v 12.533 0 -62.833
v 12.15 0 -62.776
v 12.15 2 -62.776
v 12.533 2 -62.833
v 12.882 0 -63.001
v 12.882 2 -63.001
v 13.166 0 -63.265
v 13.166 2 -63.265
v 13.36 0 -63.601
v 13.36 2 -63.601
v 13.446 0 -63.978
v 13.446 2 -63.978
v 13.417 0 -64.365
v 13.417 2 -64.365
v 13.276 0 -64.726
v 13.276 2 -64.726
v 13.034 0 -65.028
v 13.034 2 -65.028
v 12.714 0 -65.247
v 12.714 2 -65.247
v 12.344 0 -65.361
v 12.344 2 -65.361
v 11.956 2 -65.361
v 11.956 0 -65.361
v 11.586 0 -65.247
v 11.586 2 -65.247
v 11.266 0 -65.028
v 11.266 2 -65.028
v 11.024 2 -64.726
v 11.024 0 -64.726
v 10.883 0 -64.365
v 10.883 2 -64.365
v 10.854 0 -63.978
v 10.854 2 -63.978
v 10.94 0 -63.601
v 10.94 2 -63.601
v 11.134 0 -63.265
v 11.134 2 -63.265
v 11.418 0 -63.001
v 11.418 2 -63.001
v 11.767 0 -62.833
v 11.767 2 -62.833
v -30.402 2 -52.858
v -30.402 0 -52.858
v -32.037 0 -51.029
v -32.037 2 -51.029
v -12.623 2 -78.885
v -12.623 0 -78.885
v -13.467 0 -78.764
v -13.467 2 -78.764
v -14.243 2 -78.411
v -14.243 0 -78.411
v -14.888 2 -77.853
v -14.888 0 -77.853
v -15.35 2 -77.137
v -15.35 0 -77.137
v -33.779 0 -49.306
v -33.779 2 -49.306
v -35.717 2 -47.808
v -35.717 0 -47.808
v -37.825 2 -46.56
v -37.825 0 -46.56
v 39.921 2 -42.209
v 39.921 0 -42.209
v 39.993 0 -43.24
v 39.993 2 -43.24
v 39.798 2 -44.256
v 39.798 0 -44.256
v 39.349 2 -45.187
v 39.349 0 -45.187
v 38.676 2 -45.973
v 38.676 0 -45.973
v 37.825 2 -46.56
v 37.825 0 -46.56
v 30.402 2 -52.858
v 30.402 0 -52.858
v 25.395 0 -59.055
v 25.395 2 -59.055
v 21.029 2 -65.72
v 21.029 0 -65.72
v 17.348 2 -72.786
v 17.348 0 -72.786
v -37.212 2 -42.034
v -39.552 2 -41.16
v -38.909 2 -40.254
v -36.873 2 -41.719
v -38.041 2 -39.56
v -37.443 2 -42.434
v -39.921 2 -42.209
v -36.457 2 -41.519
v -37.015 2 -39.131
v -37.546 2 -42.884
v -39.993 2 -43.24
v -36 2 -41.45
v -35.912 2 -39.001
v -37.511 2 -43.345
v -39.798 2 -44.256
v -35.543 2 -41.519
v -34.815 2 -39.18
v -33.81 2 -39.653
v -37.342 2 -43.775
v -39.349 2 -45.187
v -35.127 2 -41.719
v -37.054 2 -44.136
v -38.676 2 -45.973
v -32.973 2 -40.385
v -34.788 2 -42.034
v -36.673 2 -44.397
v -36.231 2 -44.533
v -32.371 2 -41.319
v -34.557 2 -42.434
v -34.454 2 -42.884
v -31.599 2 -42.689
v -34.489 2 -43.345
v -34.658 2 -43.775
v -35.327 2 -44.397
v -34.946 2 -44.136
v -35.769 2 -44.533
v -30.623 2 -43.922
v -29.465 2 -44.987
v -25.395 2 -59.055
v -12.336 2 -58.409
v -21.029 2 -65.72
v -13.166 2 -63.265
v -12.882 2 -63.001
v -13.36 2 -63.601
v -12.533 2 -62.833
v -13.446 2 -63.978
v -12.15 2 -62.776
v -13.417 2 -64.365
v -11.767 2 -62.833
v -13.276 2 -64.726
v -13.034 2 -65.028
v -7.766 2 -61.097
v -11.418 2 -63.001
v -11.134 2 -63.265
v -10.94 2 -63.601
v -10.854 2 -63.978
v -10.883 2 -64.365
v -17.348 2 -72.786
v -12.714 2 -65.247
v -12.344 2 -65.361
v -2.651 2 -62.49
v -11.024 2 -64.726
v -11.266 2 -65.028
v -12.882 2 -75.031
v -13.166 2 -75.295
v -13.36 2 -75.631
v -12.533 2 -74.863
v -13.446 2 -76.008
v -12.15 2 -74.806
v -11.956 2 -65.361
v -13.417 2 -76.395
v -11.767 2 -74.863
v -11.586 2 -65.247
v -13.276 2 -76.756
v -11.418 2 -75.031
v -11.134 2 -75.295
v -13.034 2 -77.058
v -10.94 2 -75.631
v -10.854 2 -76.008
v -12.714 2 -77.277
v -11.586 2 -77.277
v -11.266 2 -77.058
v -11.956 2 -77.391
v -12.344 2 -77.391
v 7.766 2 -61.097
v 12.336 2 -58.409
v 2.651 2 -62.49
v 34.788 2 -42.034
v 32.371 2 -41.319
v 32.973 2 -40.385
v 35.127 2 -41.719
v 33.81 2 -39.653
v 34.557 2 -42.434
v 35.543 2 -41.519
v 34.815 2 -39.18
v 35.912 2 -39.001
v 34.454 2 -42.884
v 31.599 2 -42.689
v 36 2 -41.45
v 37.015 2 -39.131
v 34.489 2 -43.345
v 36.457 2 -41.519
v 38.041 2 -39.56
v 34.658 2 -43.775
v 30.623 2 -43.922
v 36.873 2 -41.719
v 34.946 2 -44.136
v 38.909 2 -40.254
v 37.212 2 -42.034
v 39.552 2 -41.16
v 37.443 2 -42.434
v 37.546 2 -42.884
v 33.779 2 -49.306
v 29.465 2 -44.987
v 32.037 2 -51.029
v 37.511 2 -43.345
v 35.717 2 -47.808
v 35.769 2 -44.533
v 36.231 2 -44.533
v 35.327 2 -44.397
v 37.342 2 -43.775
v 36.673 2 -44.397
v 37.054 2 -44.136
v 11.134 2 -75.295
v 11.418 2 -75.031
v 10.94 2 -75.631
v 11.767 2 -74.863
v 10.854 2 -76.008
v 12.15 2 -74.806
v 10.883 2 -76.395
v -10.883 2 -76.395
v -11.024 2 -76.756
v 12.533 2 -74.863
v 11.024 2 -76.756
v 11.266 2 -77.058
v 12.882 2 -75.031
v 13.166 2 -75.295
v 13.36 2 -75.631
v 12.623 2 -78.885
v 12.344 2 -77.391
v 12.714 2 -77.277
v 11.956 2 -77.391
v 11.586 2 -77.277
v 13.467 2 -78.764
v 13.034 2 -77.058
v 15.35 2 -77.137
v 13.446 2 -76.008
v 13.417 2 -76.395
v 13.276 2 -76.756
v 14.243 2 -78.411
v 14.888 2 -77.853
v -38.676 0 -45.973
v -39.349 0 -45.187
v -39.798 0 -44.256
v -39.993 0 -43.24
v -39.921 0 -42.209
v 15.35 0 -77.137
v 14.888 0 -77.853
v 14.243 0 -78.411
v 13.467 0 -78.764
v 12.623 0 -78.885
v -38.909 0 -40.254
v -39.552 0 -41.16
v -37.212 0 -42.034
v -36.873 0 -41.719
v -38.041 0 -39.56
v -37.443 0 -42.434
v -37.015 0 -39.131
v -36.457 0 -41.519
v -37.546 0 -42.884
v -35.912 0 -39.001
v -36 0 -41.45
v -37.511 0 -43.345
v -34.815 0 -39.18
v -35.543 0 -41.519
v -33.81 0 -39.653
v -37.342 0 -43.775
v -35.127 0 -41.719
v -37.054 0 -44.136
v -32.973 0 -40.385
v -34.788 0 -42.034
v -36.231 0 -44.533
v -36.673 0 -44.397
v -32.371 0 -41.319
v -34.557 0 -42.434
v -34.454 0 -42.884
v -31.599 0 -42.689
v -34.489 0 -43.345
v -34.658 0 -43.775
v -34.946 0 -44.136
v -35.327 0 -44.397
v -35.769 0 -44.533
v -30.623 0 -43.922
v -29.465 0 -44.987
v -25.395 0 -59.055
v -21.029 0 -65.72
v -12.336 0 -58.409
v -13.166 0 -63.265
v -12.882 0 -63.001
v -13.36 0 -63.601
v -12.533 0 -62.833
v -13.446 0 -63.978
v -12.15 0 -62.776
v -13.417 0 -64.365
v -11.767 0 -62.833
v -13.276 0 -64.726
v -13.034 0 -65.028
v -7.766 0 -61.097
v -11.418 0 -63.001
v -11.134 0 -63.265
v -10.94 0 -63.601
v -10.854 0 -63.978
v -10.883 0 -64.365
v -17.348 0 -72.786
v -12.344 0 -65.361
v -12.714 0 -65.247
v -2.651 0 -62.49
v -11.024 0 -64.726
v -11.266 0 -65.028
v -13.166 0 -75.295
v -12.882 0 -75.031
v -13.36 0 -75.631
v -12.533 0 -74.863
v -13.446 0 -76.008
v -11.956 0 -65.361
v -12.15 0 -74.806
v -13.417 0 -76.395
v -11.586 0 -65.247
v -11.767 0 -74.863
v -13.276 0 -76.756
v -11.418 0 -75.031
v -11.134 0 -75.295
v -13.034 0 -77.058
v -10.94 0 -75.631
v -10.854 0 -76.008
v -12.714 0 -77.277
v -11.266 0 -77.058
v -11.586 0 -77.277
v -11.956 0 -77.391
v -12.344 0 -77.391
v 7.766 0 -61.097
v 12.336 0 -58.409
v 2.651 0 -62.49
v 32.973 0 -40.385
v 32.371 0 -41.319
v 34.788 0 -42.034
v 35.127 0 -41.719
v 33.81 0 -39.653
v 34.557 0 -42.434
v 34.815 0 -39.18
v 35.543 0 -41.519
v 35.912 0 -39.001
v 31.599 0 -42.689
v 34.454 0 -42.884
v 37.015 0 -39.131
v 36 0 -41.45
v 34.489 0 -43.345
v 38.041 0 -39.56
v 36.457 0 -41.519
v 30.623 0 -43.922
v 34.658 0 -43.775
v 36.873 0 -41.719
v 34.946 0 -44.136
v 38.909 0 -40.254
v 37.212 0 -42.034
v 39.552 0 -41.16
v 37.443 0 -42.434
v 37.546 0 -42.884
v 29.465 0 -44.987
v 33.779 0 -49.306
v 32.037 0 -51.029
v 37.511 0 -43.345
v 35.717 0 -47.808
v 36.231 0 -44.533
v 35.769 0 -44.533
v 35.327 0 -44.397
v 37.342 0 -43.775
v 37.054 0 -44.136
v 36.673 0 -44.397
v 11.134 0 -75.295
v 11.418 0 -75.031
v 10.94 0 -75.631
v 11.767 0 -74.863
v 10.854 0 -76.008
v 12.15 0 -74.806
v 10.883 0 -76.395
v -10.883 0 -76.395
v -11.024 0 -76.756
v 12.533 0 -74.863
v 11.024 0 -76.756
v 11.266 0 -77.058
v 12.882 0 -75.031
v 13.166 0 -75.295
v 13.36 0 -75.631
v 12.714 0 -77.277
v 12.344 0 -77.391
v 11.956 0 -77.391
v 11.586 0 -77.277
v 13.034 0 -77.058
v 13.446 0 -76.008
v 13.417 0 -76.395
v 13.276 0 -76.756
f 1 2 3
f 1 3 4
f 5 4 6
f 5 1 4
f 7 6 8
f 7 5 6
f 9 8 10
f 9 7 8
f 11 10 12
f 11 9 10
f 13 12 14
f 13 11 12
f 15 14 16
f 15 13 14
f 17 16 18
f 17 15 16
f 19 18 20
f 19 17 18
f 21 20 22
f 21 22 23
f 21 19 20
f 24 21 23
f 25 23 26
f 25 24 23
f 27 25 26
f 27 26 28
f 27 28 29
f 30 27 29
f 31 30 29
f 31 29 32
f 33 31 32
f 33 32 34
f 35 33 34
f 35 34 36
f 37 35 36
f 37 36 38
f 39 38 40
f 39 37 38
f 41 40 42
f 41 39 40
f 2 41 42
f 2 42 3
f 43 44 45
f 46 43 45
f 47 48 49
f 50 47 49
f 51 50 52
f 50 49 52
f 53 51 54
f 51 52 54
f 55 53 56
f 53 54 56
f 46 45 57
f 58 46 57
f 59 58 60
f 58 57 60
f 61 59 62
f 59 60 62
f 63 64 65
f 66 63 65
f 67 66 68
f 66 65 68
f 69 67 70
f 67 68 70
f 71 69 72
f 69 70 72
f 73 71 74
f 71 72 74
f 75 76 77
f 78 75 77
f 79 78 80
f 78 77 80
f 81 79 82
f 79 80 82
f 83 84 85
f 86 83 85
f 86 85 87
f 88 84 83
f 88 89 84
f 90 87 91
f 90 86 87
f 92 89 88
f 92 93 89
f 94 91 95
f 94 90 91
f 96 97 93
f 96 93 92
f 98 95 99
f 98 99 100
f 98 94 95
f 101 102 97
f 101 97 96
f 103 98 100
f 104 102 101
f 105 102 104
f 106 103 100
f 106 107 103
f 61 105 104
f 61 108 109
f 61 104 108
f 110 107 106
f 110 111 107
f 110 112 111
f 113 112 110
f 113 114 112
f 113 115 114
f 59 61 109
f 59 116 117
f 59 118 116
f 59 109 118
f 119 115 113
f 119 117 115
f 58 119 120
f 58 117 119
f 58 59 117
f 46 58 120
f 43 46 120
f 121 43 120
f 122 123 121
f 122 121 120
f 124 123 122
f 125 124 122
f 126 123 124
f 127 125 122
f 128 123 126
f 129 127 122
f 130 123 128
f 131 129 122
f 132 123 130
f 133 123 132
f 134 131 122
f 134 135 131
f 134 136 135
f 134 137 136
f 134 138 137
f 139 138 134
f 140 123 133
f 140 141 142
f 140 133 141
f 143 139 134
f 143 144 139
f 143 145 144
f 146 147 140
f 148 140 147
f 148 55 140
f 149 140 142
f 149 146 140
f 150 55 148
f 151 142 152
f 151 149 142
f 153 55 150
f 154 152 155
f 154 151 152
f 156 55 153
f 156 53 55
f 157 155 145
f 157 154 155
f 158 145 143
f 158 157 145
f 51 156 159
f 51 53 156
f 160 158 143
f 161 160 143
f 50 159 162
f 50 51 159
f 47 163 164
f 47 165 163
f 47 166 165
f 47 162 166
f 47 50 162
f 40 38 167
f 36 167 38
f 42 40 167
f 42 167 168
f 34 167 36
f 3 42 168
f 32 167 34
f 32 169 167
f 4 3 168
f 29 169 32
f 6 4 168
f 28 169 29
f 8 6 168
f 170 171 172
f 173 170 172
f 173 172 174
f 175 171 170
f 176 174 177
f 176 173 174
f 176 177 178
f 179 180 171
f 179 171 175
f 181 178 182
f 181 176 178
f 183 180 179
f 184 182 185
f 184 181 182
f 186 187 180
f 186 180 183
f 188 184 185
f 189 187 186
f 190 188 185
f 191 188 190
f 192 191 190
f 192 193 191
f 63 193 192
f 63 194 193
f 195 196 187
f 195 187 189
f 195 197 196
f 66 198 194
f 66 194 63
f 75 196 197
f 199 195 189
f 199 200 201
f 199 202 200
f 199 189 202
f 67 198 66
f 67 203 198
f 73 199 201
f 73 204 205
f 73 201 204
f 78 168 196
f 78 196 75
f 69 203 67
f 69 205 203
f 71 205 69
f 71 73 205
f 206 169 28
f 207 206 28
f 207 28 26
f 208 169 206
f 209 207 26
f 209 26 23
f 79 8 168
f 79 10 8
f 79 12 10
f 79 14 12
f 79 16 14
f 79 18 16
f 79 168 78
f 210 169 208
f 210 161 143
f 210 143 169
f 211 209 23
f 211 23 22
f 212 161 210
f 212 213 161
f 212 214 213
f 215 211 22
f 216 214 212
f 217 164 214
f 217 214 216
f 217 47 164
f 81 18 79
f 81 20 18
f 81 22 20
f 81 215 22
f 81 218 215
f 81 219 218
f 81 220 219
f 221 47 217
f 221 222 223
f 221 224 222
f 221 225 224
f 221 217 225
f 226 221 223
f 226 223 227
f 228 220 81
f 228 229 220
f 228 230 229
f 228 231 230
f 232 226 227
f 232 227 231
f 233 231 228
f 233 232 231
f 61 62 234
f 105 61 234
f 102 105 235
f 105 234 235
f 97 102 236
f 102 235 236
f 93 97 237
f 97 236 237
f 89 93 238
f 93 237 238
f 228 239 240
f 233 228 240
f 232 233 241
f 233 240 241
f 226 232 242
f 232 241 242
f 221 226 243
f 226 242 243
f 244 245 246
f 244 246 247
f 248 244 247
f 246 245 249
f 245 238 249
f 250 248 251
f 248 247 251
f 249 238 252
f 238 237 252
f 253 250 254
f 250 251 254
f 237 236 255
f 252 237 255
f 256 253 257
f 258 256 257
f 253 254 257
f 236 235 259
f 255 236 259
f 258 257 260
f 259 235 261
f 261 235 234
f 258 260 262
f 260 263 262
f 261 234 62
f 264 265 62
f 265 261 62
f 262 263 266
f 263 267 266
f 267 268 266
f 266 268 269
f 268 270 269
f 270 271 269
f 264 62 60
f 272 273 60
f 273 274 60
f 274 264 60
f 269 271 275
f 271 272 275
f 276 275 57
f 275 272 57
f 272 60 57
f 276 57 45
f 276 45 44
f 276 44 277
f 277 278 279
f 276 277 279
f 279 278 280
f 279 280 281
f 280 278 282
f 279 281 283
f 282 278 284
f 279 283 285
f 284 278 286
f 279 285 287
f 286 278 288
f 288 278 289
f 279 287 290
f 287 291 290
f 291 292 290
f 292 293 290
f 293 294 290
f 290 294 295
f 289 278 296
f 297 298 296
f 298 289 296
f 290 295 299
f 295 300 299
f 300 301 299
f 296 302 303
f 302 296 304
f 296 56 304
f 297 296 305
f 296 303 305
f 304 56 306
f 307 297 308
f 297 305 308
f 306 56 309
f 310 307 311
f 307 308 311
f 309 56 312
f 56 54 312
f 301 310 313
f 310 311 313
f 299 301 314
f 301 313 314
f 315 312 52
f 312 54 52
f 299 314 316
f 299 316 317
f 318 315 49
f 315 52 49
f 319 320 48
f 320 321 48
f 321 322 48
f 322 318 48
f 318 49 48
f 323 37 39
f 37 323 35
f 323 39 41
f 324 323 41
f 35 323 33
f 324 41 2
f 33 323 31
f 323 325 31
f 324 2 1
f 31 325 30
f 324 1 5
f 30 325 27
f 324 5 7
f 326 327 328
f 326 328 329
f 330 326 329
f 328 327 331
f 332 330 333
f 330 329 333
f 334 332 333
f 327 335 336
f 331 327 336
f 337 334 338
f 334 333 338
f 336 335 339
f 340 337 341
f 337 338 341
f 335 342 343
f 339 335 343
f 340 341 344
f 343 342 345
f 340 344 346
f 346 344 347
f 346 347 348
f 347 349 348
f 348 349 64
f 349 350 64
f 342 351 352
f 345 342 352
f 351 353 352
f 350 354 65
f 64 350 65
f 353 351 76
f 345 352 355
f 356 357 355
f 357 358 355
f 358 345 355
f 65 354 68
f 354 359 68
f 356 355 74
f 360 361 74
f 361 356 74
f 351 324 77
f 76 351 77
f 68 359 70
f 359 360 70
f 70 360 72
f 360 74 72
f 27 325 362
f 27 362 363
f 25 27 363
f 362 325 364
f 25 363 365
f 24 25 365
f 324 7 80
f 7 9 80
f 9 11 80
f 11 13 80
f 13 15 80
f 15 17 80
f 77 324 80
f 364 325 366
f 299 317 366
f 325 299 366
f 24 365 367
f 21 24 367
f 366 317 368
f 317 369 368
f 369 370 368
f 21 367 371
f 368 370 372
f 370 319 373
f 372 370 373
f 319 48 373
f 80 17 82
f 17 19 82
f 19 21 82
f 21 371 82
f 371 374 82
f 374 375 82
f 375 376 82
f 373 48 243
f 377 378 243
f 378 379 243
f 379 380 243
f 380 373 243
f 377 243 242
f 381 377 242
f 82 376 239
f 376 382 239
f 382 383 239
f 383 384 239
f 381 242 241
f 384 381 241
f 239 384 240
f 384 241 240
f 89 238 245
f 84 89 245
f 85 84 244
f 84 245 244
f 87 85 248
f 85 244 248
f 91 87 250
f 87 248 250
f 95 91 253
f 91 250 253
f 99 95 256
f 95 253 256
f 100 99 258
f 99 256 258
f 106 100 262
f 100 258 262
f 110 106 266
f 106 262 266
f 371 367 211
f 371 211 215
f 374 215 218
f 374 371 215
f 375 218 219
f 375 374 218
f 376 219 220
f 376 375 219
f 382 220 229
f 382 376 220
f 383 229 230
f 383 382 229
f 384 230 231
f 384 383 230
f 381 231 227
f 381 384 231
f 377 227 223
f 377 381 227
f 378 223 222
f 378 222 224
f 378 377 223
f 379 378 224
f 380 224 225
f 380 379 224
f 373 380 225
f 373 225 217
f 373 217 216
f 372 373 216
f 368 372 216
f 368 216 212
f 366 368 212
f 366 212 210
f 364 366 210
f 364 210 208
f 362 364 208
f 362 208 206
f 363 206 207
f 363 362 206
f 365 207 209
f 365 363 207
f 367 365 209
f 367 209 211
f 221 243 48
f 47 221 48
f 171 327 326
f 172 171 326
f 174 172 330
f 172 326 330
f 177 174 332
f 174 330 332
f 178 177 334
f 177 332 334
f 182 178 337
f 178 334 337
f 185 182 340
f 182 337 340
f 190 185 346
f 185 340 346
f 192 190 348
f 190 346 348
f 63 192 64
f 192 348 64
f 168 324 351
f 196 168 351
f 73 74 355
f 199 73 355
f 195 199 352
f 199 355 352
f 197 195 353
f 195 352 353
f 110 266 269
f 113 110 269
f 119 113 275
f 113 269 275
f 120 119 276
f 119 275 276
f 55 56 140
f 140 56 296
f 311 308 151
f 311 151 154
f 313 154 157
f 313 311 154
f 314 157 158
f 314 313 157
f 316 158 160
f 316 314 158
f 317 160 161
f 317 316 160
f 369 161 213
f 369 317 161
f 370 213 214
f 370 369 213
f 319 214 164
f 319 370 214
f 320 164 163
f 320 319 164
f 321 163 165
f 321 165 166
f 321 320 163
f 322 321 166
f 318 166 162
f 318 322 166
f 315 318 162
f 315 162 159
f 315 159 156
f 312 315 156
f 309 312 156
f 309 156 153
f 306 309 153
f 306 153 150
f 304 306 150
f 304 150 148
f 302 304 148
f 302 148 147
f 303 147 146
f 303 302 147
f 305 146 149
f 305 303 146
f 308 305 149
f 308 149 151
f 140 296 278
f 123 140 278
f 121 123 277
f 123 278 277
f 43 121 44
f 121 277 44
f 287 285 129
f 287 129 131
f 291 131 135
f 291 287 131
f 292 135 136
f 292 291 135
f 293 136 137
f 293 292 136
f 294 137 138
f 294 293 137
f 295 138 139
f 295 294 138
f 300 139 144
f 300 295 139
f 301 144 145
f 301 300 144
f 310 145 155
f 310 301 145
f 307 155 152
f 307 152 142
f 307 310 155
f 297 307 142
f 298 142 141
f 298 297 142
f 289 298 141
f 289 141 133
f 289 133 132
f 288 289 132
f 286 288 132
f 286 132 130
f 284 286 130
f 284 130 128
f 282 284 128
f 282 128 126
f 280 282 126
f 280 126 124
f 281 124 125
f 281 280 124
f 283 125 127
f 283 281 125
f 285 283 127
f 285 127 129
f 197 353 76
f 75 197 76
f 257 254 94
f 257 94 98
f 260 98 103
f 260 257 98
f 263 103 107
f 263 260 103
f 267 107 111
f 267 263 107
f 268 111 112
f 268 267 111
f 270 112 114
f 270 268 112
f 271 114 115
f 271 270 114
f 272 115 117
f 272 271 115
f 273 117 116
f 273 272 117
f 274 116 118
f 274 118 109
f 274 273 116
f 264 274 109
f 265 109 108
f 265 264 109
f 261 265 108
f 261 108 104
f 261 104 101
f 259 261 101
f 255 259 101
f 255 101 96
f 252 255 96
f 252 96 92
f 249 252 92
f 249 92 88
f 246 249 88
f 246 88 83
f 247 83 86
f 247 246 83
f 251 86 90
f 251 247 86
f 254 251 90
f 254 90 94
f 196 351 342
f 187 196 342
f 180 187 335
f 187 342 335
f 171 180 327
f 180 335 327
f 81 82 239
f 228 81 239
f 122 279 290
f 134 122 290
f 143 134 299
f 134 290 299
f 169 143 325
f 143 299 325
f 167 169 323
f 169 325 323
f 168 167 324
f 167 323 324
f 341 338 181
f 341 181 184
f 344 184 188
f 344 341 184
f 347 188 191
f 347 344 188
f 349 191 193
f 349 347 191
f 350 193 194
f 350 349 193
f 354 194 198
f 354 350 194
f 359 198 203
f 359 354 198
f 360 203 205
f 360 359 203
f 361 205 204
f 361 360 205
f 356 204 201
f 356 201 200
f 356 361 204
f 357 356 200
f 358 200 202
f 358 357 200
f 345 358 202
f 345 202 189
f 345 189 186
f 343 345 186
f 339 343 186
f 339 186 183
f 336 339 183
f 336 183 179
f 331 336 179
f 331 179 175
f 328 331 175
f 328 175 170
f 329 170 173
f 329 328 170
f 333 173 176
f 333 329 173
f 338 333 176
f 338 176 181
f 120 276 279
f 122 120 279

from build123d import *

# Parameters (mm, degrees)
SKETCH_1_R      = 1.55
SKETCH_1_R_2    = 1.3
EXTRUDE_1_DEPTH = 2


with BuildPart() as part:
    # 草图1 → 凸台-拉伸1 (new body)
    with BuildSketch(Plane(origin=(0, 0, 0), x_dir=(1, 0, 0), z_dir=(0, 1, 0))):
        with BuildLine():
            Line((-30.40246304, 52.857720294), (-32.037278544, 51.028700347))
            ThreePointArc((-32.037278544, 51.028700347), (-34.725061467, 48.527352956), (-37.824815498, 46.559501145))
            ThreePointArc((-37.824815498, 46.559501145), (-39.603619628, 44.736066121), (-39.92091739, 42.208541335))
            ThreePointArc((-39.92091739, 42.208541335), (-36.468177596, 39.027493268), (-32.370509151, 41.318692124))
            ThreePointArc((-32.370509151, 41.318692124), (-31.135199663, 43.325028618), (-29.464750167, 44.986646546))
            Line((-29.464750167, 44.986646546), (-12.33593628, 58.408952508))
            ThreePointArc((-12.33593628, 58.408952508), (0, 62.666504283), (12.33593628, 58.408952508))
            Line((12.33593628, 58.408952508), (29.464750167, 44.986646546))
            ThreePointArc((29.464750167, 44.986646546), (31.135199663, 43.325028618), (32.370509151, 41.318692124))
            ThreePointArc((32.370509151, 41.318692124), (36.468177596, 39.027493268), (39.92091739, 42.208541335))
            ThreePointArc((39.92091739, 42.208541335), (39.603619628, 44.736066121), (37.824815498, 46.559501145))
            ThreePointArc((37.824815498, 46.559501145), (34.725061467, 48.527352956), (32.037278544, 51.028700347))
            Line((32.037278544, 51.028700347), (30.40246304, 52.857720294))
            ThreePointArc((30.40246304, 52.857720294), (23.129287971, 62.333031959), (17.34800881, 72.785659285))
            Line((17.34800881, 72.785659285), (15.34970392, 77.137234504))
            ThreePointArc((15.34970392, 77.137234504), (14.242702771, 78.410741128), (12.62341972, 78.885286238))
            Line((12.62341972, 78.885286238), (-12.62341972, 78.885286238))
            ThreePointArc((-12.62341972, 78.885286238), (-14.242702771, 78.410741128), (-15.34970392, 77.137234504))
            Line((-15.34970392, 77.137234504), (-17.34800881, 72.785659285))
            ThreePointArc((-17.34800881, 72.785659285), (-23.129287971, 62.333031959), (-30.40246304, 52.857720294))
        make_face()
        with Locations(Location((-36, 43, 0), (0, 0, 270))):
            Circle(SKETCH_1_R, mode=Mode.SUBTRACT)
        with Locations(Location((36, 43, 0), (0, 0, 270))):
            Circle(SKETCH_1_R, mode=Mode.SUBTRACT)
        with Locations(Location((-12.15, 64.075512735, 0), (0, 0, 270))):
            Circle(SKETCH_1_R_2, mode=Mode.SUBTRACT)
        with Locations(Location((-12.15, 76.105512735, 0), (0, 0, 270))):
            Circle(SKETCH_1_R_2, mode=Mode.SUBTRACT)
        with Locations(Location((12.15, 64.075512735, 0), (0, 0, 270))):
            Circle(SKETCH_1_R_2, mode=Mode.SUBTRACT)
        with Locations(Location((12.15, 76.105512735, 0), (0, 0, 270))):
            Circle(SKETCH_1_R_2, mode=Mode.SUBTRACT)
    extrude(amount=EXTRUDE_1_DEPTH)


solid = part.part
